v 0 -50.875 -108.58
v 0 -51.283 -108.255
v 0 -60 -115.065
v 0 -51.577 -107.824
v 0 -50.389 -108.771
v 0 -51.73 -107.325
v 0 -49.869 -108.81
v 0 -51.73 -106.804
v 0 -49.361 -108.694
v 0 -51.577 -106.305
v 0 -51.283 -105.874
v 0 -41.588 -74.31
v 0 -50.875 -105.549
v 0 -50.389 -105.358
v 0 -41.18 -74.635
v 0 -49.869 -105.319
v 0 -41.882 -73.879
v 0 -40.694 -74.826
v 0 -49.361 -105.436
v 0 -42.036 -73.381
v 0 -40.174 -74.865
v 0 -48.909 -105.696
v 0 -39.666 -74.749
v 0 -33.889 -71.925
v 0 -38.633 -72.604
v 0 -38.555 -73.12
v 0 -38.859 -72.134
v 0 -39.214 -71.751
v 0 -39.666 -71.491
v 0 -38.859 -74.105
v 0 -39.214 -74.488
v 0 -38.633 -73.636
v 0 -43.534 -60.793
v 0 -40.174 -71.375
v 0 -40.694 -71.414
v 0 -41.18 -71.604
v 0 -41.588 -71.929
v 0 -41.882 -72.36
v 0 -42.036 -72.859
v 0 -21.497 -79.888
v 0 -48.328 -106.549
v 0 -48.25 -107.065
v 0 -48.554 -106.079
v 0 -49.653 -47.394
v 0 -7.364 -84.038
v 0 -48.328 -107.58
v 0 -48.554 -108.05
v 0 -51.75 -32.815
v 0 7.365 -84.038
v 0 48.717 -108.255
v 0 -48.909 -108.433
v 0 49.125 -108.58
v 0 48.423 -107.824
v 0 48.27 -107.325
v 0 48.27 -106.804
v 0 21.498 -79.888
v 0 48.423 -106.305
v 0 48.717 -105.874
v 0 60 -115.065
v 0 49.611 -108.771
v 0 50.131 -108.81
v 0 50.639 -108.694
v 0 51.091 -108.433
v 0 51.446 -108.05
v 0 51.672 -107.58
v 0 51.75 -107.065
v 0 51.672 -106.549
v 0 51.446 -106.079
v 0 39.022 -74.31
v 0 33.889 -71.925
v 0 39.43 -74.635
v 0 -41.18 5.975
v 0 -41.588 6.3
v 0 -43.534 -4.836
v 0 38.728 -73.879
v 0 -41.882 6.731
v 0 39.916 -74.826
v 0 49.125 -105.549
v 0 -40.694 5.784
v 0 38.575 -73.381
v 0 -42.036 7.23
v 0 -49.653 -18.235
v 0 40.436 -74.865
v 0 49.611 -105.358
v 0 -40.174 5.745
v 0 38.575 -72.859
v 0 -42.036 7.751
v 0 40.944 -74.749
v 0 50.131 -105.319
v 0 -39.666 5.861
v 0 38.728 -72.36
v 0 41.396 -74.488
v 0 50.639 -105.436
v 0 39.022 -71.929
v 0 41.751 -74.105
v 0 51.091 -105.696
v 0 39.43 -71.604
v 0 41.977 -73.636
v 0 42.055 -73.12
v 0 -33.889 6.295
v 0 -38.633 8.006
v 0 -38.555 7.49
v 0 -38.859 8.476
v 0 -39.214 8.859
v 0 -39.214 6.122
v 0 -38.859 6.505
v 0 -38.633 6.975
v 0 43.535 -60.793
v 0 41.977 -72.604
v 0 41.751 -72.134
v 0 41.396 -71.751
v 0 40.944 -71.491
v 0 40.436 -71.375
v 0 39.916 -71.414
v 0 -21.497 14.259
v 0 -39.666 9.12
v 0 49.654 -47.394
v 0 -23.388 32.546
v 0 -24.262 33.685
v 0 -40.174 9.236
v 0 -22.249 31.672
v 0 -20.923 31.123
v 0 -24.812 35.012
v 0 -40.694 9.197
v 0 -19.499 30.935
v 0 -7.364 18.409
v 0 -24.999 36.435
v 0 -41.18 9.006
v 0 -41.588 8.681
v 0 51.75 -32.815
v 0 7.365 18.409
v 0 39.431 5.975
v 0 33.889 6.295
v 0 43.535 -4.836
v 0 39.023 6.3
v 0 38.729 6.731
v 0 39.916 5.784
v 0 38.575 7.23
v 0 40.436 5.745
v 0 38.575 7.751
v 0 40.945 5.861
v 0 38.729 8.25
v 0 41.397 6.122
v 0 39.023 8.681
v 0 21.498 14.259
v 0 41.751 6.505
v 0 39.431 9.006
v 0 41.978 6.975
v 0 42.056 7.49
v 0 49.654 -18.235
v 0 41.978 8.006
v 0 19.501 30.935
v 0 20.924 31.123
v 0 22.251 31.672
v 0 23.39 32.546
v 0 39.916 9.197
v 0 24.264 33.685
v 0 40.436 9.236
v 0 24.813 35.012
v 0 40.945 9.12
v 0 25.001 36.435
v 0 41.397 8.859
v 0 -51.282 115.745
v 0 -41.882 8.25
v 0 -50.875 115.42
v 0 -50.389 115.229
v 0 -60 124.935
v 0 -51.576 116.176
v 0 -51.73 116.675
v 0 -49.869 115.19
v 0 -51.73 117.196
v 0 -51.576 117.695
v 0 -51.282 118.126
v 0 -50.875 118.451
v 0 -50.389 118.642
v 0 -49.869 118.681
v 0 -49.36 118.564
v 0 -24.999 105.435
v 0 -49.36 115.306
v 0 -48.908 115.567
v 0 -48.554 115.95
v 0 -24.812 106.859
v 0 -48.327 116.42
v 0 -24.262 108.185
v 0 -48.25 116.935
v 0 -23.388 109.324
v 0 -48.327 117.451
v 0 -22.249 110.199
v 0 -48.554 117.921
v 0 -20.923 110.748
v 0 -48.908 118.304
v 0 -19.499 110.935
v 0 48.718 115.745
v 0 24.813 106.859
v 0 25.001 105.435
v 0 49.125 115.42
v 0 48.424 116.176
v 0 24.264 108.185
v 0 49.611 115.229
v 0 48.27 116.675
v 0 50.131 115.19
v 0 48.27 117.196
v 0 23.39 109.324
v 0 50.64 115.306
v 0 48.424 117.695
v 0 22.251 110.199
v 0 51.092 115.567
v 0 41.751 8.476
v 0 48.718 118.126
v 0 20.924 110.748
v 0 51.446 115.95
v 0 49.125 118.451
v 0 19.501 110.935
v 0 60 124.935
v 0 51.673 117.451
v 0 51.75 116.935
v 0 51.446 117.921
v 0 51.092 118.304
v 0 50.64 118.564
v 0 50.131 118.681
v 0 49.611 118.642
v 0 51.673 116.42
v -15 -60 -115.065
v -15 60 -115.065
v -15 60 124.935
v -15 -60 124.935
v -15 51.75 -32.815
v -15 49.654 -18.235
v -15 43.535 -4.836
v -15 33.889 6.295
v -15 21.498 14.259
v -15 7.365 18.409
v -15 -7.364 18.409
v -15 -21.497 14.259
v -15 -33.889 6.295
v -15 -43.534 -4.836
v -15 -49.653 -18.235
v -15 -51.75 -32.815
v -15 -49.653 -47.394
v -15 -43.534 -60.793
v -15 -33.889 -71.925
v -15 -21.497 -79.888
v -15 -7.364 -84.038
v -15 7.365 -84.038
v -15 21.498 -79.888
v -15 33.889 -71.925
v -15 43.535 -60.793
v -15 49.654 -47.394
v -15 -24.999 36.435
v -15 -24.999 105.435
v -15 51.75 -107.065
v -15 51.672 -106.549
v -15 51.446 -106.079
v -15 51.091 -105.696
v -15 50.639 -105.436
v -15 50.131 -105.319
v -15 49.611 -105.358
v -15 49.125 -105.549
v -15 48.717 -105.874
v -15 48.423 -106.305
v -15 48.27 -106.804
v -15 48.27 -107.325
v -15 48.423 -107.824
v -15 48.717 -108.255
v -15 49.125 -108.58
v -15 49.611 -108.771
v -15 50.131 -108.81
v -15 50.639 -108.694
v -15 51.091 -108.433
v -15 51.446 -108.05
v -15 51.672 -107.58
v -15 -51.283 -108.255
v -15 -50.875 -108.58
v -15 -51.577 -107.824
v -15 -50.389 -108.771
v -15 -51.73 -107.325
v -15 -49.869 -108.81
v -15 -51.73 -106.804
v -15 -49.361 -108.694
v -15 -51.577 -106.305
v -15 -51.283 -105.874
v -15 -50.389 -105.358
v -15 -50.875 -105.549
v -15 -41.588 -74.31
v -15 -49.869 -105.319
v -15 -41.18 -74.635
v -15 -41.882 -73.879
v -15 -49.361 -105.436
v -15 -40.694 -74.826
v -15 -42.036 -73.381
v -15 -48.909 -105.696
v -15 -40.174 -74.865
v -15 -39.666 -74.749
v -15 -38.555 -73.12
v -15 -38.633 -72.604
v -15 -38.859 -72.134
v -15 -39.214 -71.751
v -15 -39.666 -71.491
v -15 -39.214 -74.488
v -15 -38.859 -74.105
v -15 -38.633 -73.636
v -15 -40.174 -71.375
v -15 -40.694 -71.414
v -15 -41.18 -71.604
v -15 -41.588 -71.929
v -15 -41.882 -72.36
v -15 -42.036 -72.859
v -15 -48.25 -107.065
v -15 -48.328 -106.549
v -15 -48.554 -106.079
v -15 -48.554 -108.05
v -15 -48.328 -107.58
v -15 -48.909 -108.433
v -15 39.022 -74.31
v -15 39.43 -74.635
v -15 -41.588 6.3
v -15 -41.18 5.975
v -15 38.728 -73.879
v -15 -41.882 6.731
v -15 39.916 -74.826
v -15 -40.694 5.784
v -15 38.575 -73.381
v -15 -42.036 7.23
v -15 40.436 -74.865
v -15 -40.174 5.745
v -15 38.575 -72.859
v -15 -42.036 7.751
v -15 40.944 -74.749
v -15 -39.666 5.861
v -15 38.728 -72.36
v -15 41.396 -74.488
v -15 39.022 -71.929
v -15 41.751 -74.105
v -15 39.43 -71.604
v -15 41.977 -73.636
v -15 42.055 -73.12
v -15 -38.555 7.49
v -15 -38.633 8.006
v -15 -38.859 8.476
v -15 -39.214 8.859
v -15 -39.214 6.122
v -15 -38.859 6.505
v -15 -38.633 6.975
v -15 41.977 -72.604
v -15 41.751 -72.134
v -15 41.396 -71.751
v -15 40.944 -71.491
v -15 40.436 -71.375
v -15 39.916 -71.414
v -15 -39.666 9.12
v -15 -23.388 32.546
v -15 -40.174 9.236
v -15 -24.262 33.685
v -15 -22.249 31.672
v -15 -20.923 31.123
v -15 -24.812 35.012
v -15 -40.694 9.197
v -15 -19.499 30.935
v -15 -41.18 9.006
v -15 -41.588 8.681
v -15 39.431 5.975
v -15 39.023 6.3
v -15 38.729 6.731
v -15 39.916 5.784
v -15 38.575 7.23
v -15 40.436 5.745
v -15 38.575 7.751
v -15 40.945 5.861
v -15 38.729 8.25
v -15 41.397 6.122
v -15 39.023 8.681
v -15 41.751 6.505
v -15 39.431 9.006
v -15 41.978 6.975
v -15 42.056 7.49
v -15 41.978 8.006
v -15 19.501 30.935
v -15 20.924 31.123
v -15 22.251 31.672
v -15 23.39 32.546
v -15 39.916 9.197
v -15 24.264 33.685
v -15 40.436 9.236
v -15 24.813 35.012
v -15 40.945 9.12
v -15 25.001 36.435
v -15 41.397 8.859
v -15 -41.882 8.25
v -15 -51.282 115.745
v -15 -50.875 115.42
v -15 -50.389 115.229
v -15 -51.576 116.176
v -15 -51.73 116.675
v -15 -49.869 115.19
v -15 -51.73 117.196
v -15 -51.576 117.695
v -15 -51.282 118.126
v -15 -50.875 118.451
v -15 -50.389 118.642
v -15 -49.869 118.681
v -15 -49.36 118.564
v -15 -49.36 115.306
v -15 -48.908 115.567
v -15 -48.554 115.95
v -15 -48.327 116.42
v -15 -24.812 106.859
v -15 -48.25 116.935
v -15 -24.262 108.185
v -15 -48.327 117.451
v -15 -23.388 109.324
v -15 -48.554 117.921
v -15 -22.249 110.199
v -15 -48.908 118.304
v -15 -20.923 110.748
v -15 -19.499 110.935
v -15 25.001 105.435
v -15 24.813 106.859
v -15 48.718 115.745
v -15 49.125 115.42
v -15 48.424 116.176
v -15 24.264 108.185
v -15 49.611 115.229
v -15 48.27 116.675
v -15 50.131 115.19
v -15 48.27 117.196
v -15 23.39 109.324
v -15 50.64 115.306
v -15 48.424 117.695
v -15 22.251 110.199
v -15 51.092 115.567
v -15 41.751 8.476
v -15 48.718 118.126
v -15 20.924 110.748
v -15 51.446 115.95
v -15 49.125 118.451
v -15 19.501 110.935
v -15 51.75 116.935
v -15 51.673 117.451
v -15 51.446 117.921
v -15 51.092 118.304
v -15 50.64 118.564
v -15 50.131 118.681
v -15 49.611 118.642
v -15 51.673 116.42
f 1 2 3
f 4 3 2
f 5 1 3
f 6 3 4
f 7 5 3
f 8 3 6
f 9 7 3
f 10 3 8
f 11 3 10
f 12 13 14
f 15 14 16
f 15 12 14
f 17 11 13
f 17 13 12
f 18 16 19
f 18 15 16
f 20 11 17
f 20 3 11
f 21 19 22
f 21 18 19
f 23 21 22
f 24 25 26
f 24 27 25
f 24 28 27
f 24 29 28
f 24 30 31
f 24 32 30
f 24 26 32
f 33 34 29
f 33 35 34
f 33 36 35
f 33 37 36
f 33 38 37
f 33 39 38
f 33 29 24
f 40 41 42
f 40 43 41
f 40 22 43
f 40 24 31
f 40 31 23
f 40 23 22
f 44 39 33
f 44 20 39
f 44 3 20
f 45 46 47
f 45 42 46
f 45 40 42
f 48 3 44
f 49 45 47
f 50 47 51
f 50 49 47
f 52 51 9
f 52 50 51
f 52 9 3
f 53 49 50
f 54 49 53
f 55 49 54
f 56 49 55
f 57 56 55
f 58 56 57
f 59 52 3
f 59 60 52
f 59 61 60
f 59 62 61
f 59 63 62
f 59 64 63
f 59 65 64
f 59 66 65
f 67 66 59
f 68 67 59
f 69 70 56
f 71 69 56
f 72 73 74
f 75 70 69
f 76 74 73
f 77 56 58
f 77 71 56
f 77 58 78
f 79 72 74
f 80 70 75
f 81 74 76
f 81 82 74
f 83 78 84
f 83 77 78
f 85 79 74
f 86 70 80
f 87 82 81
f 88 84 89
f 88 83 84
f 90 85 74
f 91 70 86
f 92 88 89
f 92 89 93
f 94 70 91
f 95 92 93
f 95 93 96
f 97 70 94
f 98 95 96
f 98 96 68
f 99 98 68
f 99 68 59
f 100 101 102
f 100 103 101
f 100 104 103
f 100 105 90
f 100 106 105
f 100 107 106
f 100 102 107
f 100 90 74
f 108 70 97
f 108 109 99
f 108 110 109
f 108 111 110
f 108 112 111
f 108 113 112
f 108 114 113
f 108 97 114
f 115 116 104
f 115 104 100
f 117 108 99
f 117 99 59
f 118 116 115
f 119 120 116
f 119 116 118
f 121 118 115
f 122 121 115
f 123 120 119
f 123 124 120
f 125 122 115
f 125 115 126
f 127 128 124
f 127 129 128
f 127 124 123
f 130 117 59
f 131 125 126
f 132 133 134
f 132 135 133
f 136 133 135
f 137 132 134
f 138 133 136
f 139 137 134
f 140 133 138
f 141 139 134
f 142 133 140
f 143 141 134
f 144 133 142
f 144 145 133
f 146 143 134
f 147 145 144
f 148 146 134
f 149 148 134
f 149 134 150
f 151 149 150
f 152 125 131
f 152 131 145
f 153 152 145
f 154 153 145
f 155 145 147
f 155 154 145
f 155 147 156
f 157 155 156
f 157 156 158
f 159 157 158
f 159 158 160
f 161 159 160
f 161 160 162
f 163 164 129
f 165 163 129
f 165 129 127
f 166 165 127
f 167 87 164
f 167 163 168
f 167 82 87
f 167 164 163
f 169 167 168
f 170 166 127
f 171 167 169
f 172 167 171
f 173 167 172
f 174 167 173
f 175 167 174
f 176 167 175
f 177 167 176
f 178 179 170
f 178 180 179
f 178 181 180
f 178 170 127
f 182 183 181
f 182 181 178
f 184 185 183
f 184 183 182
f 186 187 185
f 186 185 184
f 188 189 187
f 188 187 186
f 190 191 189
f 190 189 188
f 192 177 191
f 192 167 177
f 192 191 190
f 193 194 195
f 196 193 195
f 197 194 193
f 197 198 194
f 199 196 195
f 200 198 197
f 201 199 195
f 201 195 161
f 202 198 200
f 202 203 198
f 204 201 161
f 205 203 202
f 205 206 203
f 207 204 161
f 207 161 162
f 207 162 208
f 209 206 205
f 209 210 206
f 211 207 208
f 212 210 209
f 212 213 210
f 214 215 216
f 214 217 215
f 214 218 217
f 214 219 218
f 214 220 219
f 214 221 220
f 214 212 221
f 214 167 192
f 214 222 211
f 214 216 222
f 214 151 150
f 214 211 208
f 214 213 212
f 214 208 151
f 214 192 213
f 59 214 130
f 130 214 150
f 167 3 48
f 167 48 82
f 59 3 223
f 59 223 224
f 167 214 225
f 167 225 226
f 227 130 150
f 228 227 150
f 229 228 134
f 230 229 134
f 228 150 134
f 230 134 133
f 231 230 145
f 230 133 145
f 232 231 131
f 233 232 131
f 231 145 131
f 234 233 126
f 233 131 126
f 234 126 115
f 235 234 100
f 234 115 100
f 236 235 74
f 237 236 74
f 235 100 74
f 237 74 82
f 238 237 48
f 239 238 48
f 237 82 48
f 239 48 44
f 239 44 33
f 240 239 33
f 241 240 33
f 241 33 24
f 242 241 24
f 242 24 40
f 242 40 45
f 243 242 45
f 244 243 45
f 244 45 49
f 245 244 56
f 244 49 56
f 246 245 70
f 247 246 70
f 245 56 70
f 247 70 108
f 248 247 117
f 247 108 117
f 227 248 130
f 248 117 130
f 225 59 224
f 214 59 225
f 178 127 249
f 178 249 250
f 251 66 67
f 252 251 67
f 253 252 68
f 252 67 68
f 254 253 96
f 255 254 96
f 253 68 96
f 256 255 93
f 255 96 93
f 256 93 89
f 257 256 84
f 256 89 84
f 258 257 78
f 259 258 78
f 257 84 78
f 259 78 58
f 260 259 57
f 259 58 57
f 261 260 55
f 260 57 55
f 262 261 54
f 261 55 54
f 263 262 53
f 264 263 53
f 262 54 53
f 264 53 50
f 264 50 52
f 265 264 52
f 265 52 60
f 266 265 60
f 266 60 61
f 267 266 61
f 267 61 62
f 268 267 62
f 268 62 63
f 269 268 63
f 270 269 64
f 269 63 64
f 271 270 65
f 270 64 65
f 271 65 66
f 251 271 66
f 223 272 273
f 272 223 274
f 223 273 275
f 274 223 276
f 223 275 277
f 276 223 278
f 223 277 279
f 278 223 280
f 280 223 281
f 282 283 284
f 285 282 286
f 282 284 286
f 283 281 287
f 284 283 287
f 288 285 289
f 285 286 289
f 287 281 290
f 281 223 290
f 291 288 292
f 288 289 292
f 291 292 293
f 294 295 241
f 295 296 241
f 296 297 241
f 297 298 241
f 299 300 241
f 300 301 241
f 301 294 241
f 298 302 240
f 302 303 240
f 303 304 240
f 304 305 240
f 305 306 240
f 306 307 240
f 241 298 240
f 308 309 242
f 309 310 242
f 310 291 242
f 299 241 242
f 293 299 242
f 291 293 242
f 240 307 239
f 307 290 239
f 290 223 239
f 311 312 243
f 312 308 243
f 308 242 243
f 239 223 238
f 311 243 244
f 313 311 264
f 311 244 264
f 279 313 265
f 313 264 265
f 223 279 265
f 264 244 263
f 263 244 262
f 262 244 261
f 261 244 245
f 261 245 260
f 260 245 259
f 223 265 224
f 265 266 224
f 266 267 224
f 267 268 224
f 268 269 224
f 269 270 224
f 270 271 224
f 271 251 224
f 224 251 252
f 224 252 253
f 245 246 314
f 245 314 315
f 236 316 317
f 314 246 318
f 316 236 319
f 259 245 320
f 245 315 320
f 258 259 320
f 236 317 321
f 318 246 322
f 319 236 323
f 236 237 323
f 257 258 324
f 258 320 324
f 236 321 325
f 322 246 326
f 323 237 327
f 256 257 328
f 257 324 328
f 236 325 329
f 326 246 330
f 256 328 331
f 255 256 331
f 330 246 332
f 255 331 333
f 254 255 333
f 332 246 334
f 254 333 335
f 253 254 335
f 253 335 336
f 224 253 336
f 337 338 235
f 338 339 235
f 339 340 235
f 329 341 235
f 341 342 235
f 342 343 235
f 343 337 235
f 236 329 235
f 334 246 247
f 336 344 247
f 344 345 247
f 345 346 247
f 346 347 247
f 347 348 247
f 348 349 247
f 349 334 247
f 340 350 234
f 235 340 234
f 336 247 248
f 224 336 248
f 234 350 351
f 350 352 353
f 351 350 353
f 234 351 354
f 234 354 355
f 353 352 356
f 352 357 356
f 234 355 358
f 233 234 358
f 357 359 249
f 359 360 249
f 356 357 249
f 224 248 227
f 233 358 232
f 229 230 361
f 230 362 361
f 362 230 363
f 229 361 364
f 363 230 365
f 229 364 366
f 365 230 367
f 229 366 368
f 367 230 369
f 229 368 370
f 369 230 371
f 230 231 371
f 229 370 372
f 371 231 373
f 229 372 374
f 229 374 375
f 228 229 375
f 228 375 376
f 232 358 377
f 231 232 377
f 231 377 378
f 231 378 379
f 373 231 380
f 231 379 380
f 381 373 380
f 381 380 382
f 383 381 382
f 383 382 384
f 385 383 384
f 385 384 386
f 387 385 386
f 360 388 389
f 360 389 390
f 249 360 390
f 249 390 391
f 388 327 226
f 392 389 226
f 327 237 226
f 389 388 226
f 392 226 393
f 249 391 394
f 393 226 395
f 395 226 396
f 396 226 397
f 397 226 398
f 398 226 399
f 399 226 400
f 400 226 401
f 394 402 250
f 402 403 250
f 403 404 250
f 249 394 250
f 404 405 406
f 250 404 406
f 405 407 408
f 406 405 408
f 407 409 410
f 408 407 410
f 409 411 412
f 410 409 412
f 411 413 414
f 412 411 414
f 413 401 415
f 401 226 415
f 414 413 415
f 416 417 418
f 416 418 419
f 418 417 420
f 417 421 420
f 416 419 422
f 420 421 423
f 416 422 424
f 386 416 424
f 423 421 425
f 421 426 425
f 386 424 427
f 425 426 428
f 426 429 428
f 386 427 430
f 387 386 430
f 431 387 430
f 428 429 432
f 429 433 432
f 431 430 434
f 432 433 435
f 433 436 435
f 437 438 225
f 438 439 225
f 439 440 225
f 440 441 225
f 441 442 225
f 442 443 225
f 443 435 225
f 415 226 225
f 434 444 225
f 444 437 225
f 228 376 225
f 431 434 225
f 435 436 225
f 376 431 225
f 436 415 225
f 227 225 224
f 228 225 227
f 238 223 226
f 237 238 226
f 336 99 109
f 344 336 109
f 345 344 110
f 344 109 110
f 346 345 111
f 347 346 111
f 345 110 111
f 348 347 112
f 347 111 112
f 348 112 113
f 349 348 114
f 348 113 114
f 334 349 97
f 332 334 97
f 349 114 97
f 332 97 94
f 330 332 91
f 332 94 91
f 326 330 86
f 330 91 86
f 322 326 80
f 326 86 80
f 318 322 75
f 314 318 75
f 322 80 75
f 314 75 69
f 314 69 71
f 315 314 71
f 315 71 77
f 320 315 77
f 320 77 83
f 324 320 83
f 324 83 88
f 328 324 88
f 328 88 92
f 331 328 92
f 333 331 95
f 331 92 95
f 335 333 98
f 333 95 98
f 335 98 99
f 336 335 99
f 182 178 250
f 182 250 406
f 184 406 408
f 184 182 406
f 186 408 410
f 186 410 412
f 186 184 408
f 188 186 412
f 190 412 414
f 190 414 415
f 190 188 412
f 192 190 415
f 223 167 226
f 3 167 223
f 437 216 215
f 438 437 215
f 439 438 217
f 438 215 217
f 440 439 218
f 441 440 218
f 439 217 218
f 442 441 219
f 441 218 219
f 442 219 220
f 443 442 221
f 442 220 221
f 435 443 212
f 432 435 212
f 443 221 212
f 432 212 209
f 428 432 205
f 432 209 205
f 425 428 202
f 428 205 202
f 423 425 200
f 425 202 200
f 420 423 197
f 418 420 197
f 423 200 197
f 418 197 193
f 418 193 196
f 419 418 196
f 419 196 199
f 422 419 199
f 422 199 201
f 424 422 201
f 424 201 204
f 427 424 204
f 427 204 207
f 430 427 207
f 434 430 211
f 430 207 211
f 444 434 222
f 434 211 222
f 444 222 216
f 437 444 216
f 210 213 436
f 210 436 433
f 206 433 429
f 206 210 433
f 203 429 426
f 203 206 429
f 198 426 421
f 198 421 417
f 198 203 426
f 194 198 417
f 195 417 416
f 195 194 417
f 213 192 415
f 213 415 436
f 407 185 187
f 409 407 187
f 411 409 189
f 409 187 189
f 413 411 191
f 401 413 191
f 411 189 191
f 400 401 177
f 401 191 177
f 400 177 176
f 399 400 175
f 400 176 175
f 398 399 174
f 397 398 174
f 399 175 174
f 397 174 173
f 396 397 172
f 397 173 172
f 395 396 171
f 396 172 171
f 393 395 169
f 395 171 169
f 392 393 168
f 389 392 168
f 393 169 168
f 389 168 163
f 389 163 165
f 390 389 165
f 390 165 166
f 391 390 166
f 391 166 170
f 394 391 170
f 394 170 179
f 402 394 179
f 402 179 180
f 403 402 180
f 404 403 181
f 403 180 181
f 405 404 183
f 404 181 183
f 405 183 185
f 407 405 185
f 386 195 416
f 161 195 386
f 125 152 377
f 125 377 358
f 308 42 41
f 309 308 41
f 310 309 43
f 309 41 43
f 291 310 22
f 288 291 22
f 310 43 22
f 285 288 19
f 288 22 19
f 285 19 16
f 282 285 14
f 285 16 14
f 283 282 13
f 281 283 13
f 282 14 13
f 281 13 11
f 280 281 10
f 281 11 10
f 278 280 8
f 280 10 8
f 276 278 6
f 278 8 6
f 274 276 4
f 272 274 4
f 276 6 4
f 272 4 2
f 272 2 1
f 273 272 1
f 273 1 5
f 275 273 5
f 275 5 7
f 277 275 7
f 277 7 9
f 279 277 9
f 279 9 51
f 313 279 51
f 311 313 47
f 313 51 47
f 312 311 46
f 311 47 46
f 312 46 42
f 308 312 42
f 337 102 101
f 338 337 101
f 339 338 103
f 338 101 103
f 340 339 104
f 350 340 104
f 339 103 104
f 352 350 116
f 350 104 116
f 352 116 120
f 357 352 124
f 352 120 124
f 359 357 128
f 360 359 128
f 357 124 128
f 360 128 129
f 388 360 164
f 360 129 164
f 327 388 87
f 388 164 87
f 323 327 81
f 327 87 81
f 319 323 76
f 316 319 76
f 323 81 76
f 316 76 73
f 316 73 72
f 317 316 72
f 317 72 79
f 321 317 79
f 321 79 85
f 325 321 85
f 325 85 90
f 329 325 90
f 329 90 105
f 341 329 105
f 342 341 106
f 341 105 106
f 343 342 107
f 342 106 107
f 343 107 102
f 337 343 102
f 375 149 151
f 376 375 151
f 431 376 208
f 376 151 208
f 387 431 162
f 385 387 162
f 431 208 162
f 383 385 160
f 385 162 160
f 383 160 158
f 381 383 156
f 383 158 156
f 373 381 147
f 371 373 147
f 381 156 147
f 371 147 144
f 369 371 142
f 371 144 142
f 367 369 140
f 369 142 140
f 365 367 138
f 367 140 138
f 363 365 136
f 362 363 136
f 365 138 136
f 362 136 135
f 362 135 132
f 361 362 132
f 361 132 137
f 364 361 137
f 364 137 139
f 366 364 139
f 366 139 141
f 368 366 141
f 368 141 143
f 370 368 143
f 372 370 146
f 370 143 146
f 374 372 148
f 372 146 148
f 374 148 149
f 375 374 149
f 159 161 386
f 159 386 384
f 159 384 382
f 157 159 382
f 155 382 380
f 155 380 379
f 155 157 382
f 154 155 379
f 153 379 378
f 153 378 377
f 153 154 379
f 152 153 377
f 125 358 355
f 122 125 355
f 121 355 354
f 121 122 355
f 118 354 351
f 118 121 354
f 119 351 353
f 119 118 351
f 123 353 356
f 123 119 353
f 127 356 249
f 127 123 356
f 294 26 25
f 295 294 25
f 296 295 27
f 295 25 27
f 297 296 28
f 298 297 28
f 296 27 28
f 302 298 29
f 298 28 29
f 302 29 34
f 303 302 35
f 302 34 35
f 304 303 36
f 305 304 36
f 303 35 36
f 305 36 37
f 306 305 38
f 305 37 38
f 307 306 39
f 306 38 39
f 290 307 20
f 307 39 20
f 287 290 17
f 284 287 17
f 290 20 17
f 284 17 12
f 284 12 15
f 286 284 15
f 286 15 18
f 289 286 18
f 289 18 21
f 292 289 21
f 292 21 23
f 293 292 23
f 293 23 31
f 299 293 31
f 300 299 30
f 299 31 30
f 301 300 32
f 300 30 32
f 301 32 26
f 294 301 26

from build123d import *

# Parameters (mm, degrees)
F0_R     = 1.75
F0_R_2   = 51.75
F1_DEPTH = 15


# Not quite as in the source:
# - ends of sketch curves that miss each other by under 0.0002 mm in the source are joined


with BuildPart() as f1:
    # F0 (on Right) → F1 (new body)
    with BuildSketch(Plane.YZ):
        Polygon((-59.9995488366, -115.0645988089), (60.0004511634, -115.0645988089), (60.0004498223, 124.9354011911), (0.0004538456, 124.9354011911), (-59.9995488366, 124.9354011911), align=None)
        with Locations((-49.9999973178, -107.0645988089)):
            Circle(F0_R, mode=Mode.SUBTRACT)
        with Locations((-40.3050865276, -73.1196853366)):
            Circle(F0_R, mode=Mode.SUBTRACT)
        with Locations((0.0004511634, -32.8145988089)):
            Circle(F0_R_2, mode=Mode.SUBTRACT)
        with Locations((50.0000026822, -107.0645988089)):
            Circle(F0_R, mode=Mode.SUBTRACT)
        with Locations((40.3050865276, -73.1196853366)):
            Circle(F0_R, mode=Mode.SUBTRACT)
        with Locations((-40.3050865276, 7.4904877187)):
            Circle(F0_R, mode=Mode.SUBTRACT)
        with Locations((-49.9995488366, 116.9354011911)):
            Circle(F0_R, mode=Mode.SUBTRACT)
        with Locations((40.305537691, 7.4904877187)):
            Circle(F0_R, mode=Mode.SUBTRACT)
        with BuildLine():
            Line((-19.4991003554, 110.9354010969), (19.5008996446, 110.9354010969))
            ThreePointArc((19.5008996446, 110.9354010969), (23.3899869411, 109.3244883935), (25.0008996446, 105.4354010969))
            Line((25.0008996446, 105.4354010969), (25.0008996446, 36.4354010969))
            ThreePointArc((25.0008996446, 36.4354010969), (23.3899869411, 32.5463138004), (19.5008996446, 30.9354010969))
            Line((19.5008996446, 30.9354010969), (-19.4991003554, 30.9354010969))
            ThreePointArc((-19.4991003554, 30.9354010969), (-23.3881876519, 32.5463138004), (-24.9991003554, 36.4354010969))
            Line((-24.9991003554, 36.4354010969), (-24.9991003554, 105.4354010969))
            ThreePointArc((-24.9991003554, 105.4354010969), (-23.3881876519, 109.3244883935), (-19.4991003554, 110.9354010969))
        make_face(mode=Mode.SUBTRACT)
        with Locations((50.0004511634, 116.9354046481)):
            Circle(F0_R, mode=Mode.SUBTRACT)
    extrude(amount=-F1_DEPTH)


solid = f1.part
